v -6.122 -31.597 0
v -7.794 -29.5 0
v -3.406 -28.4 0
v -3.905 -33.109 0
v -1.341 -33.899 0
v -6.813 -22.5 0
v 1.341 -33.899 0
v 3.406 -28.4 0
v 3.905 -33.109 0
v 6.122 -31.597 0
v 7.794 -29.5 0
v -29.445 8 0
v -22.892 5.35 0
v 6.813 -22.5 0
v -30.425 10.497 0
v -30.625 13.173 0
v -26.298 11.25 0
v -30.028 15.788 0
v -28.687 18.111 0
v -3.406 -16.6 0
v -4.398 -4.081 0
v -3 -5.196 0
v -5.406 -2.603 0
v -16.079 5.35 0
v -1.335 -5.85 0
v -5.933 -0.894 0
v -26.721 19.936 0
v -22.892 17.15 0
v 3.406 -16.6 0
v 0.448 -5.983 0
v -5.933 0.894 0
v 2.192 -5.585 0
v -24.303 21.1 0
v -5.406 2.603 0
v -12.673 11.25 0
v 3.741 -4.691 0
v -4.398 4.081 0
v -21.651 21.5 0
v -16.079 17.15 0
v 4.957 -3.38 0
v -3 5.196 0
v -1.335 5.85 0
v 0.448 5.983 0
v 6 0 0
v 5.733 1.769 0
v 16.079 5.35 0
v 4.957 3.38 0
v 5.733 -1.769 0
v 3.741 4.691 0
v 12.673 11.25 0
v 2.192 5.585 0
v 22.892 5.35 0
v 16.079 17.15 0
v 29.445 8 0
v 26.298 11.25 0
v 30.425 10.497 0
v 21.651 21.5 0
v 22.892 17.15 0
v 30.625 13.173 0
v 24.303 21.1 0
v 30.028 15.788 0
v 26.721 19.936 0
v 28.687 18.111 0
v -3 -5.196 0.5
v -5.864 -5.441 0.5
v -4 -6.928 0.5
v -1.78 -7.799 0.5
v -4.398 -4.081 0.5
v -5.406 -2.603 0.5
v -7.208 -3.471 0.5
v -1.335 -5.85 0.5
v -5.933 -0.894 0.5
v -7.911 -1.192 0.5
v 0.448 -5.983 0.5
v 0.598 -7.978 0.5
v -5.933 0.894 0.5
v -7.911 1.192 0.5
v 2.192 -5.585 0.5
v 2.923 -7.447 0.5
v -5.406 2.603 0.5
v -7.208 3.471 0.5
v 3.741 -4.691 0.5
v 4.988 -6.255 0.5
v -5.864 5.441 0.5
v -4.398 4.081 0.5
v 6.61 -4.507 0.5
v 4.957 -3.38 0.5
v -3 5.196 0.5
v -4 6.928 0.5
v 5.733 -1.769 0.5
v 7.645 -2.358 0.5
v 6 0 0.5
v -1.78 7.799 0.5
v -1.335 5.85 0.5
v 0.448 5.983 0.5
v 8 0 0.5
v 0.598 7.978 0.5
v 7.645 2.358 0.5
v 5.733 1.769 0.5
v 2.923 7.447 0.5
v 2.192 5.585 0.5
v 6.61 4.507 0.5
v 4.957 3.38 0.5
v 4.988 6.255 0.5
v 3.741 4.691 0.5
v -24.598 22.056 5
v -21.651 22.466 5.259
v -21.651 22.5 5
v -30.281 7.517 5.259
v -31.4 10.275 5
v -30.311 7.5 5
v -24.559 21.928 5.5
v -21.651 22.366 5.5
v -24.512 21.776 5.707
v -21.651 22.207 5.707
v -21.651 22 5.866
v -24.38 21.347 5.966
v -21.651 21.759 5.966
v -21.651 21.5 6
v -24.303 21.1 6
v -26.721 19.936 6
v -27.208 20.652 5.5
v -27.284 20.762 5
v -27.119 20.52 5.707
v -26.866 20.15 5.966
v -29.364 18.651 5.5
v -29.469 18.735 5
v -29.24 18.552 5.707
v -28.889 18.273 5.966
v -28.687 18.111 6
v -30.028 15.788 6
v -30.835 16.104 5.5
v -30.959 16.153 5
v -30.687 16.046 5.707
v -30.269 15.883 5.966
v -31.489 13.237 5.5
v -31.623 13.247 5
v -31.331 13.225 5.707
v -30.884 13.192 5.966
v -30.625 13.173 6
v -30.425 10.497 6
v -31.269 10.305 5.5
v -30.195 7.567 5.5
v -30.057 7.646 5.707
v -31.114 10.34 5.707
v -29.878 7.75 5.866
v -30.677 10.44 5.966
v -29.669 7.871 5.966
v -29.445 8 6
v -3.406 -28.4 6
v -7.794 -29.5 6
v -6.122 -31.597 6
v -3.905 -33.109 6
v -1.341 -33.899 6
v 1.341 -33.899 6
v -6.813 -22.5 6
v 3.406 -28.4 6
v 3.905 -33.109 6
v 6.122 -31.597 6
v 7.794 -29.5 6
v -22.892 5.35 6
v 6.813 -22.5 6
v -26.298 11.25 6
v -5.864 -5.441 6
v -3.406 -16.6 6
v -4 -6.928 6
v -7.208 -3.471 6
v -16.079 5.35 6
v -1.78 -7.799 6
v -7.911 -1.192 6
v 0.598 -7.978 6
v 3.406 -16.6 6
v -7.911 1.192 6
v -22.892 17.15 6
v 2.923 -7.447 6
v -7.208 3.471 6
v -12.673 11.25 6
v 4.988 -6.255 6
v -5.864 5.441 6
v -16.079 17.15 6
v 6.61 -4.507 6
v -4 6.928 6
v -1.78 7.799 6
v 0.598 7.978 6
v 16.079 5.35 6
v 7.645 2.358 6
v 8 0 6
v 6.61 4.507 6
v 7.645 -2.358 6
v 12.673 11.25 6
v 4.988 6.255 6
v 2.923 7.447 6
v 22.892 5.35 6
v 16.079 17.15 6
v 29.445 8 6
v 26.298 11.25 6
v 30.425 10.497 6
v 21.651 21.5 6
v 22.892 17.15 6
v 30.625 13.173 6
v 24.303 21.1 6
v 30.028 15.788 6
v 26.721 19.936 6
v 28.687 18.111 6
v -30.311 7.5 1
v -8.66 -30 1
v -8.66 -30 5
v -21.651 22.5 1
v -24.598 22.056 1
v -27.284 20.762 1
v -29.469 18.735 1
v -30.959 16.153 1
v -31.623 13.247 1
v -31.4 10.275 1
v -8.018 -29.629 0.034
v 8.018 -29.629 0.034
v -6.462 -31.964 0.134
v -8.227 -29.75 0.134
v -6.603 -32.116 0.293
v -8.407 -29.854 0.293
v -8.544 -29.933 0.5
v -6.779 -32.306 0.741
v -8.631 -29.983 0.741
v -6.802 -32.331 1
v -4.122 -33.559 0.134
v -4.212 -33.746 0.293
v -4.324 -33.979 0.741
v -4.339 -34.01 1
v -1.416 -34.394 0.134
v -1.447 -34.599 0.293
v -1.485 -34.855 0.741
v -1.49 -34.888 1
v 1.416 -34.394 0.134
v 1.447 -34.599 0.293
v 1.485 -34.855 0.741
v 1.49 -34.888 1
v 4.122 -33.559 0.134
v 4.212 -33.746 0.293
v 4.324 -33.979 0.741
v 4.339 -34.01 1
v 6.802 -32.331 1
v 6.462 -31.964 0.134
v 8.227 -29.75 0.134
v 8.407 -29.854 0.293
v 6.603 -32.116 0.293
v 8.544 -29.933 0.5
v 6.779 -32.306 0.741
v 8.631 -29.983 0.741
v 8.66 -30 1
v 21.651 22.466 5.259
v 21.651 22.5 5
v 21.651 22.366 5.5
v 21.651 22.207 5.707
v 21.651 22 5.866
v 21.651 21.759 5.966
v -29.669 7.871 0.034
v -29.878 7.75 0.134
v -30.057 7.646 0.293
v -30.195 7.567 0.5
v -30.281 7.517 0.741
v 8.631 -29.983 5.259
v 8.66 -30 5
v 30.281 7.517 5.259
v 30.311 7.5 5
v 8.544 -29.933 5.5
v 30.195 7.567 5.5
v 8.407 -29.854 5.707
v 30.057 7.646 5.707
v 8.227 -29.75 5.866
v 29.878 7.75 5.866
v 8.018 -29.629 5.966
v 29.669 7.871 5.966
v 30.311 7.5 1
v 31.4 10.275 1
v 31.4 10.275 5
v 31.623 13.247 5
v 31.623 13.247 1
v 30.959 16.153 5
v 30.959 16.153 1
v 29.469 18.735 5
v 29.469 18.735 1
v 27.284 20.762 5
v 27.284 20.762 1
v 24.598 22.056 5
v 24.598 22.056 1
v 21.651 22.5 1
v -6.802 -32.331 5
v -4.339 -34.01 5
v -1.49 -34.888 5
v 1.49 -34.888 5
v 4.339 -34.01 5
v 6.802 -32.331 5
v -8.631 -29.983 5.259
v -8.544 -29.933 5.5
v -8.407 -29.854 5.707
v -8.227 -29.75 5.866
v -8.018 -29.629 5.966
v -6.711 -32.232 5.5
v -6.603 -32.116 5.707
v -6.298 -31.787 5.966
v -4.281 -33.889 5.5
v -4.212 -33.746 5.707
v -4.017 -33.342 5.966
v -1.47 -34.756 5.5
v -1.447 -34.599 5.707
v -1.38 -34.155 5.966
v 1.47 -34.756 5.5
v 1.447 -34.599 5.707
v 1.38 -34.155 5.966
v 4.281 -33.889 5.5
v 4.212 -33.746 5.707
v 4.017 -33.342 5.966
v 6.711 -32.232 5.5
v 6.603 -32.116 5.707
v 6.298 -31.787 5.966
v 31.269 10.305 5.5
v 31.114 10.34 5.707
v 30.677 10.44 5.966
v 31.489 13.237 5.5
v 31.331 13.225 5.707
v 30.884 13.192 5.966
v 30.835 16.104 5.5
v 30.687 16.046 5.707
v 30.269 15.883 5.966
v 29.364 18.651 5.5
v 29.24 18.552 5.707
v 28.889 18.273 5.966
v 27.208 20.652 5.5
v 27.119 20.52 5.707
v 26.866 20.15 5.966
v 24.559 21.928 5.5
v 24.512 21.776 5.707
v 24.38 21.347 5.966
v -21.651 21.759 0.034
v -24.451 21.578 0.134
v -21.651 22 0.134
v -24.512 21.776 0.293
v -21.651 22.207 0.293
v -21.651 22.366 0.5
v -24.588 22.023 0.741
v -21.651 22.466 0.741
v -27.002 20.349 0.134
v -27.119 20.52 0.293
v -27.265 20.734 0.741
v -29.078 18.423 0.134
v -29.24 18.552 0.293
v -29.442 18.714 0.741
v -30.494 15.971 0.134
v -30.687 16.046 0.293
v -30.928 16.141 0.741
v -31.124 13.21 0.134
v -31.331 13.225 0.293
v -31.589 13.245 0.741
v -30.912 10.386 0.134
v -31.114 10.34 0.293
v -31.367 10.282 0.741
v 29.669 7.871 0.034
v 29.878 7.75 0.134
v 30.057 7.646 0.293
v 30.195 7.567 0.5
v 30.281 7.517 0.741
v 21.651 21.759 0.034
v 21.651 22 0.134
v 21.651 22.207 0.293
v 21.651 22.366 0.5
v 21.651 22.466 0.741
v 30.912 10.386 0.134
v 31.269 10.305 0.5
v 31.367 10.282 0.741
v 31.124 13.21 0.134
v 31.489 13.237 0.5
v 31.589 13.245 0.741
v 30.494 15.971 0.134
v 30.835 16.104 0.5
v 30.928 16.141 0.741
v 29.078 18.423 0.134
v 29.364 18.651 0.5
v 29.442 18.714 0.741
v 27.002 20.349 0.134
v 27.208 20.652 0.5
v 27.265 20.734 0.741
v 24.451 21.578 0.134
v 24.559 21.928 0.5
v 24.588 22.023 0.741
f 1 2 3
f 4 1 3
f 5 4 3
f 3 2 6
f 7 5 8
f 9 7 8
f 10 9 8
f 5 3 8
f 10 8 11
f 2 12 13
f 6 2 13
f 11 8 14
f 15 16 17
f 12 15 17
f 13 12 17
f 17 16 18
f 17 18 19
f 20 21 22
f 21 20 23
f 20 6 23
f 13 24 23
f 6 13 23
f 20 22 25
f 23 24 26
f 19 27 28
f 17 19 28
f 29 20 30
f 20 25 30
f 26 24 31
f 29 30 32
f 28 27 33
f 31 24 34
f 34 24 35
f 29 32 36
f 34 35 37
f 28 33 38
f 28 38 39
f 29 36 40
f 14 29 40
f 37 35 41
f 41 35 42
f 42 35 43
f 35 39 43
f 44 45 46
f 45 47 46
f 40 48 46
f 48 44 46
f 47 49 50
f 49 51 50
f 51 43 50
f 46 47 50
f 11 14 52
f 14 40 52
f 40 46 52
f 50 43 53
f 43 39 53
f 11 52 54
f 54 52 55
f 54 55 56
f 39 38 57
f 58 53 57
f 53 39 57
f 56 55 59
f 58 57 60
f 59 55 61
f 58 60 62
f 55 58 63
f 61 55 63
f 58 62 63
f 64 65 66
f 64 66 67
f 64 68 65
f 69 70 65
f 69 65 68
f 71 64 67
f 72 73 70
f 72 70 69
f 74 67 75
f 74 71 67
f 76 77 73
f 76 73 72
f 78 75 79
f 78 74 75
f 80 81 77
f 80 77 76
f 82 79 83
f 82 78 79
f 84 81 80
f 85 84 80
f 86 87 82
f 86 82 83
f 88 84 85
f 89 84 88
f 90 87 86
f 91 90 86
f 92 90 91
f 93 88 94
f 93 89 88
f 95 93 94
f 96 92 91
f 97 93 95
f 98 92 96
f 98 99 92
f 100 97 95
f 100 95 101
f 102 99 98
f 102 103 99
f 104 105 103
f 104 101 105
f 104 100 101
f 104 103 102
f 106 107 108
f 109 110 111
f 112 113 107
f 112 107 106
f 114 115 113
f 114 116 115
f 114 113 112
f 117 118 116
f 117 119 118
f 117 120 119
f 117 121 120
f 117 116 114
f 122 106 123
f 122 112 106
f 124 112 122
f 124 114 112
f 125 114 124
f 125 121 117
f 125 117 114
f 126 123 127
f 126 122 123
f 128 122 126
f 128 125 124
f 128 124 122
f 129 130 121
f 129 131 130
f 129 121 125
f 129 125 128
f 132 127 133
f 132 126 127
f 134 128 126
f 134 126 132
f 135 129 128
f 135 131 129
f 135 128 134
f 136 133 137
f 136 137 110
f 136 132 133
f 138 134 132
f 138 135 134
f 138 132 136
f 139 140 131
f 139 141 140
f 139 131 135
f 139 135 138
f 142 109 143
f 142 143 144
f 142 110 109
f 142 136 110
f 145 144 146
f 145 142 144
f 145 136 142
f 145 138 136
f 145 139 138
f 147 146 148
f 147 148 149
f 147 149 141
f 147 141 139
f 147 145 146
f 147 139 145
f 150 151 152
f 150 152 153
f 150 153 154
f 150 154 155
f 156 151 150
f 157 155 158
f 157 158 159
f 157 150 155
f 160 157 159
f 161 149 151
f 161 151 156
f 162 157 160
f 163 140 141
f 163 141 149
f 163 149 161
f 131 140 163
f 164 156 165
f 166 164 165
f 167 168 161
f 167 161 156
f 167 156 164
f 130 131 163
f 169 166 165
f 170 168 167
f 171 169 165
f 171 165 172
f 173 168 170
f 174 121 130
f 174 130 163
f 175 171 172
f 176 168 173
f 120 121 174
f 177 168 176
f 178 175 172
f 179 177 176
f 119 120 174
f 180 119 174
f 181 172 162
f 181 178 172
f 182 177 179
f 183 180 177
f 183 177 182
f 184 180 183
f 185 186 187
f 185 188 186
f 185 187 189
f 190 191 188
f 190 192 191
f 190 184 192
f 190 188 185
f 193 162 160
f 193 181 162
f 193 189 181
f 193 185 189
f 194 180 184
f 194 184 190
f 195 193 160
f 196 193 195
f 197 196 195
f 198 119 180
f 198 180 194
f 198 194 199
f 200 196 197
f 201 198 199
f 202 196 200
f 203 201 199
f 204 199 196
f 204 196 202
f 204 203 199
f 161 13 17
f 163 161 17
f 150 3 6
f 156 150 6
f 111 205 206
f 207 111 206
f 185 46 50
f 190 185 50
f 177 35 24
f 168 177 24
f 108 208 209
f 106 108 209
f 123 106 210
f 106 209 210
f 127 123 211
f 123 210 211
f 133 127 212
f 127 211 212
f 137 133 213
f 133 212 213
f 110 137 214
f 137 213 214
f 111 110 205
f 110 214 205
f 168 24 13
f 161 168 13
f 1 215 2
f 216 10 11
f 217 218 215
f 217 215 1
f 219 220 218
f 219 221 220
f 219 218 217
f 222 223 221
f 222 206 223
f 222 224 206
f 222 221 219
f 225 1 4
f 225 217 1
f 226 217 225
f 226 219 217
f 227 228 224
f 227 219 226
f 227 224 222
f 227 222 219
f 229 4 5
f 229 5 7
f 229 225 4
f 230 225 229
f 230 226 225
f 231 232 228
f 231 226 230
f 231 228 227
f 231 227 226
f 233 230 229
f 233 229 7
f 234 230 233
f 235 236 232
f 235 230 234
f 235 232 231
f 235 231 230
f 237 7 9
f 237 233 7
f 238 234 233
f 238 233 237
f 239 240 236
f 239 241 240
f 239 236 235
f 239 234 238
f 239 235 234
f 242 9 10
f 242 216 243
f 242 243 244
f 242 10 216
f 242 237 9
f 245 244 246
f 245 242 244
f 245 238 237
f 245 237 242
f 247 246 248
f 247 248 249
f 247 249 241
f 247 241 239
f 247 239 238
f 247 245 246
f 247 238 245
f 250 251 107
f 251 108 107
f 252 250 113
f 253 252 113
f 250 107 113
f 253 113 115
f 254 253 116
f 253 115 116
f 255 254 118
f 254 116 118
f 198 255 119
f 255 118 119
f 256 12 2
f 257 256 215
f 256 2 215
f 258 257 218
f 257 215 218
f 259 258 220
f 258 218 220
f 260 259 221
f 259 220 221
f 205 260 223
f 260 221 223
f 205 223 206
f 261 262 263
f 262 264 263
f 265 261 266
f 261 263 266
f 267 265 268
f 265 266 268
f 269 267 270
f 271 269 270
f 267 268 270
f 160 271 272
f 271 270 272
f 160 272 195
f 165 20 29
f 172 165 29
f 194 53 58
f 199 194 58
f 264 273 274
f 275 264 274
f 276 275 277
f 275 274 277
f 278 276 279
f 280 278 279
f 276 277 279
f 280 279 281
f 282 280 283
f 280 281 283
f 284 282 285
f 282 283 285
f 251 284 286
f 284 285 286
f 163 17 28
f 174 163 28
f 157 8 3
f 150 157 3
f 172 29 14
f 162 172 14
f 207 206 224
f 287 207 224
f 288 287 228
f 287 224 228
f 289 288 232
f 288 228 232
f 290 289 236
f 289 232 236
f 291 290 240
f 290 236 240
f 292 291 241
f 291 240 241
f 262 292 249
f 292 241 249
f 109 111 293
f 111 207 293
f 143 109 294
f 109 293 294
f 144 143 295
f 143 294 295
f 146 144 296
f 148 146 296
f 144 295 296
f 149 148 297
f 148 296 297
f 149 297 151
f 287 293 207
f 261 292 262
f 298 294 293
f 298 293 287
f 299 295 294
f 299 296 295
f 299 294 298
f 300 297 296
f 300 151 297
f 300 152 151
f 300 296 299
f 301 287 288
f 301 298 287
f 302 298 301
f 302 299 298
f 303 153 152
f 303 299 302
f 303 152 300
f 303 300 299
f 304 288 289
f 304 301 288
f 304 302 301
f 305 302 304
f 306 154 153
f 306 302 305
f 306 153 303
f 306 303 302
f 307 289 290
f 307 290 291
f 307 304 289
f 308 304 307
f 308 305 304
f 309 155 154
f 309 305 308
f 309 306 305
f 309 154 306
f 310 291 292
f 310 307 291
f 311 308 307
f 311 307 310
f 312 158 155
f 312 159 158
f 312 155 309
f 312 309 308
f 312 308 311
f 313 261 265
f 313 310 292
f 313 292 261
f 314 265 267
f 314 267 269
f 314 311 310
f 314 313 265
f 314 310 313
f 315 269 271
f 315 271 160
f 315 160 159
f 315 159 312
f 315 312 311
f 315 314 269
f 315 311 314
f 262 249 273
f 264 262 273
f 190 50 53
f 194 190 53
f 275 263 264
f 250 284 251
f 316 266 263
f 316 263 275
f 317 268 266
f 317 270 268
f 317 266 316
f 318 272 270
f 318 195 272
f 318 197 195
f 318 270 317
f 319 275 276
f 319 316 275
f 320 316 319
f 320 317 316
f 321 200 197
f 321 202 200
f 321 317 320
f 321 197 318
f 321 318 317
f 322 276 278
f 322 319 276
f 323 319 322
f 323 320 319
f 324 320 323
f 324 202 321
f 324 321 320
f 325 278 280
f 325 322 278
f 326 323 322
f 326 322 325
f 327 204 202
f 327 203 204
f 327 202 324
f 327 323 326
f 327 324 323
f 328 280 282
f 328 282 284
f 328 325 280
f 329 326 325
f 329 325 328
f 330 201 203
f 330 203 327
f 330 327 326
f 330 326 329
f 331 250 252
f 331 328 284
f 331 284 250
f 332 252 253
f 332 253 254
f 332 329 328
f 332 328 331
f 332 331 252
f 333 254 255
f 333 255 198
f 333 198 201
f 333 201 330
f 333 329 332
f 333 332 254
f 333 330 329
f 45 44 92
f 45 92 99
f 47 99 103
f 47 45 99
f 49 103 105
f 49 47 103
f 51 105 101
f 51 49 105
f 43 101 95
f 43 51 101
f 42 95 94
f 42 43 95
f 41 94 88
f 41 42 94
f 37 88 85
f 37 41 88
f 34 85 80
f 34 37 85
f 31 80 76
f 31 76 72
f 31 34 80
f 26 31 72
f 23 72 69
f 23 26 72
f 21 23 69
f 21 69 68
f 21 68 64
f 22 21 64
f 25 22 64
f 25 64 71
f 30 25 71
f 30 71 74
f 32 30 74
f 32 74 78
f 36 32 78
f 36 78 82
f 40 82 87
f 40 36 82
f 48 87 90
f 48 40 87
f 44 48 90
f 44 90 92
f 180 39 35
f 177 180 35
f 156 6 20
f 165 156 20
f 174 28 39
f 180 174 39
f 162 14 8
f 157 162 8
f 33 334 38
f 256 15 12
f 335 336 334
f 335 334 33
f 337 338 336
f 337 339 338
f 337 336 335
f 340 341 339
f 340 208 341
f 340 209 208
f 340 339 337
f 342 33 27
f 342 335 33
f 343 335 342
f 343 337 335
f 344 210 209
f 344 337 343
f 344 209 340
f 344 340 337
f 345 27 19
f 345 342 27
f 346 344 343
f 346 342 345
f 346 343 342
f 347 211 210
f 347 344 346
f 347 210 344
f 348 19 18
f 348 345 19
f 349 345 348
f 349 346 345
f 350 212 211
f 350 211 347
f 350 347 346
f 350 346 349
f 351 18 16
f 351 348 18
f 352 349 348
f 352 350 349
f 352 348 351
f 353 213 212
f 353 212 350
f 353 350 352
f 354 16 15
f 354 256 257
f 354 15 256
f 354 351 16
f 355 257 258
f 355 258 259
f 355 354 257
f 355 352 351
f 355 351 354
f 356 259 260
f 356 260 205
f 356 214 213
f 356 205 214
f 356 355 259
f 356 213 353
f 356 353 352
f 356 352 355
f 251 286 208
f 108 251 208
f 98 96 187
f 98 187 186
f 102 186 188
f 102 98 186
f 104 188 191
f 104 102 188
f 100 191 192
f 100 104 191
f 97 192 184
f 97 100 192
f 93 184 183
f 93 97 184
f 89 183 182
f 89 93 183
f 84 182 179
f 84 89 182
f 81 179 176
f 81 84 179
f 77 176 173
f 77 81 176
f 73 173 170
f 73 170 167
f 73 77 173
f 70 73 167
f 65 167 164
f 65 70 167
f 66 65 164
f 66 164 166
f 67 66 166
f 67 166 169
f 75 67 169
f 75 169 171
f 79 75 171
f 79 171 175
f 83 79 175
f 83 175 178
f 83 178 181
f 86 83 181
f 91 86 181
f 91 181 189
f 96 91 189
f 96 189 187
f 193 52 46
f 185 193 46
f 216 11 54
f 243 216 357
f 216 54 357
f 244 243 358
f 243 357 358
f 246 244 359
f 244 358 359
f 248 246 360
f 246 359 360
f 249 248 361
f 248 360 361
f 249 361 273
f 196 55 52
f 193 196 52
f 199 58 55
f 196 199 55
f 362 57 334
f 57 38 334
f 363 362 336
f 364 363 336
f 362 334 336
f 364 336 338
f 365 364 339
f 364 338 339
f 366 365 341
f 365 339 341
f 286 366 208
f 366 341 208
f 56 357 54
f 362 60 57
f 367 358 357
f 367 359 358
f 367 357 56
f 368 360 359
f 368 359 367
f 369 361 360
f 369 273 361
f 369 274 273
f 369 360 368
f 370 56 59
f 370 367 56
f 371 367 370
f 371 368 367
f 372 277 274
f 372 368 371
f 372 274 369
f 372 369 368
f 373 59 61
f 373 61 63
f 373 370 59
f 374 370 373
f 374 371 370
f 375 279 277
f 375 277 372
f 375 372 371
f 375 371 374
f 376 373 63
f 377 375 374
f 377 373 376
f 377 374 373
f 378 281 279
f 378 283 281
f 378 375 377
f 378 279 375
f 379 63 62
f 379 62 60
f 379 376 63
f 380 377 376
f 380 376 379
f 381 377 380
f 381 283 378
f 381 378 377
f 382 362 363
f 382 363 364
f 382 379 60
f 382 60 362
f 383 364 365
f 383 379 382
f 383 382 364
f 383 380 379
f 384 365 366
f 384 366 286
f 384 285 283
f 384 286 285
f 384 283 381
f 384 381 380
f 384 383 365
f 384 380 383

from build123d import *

# Parameters (mm, degrees)
F0_R     = 8
F1_DEPTH = 6
F2_R     = 8
F2_R_2   = 6
F3_DEPTH = 0.5
F4_R     = 1


with BuildPart() as f1:
    # F0 (on Top) → F1 (new body)
    with BuildSketch(Plane.XY):
        with BuildLine():
            Line((8.660254, -30), (30.310889, 7.5))
            ThreePointArc((30.310889, 7.5), (30.310889, 17.5), (21.650635, 22.5))
            Line((21.650635, 22.5), (-21.650635, 22.5))
            ThreePointArc((-21.650635, 22.5), (-30.310889, 17.5), (-30.310889, 7.5))
            Line((-30.310889, 7.5), (-8.660254, -30))
            ThreePointArc((-8.660254, -30), (0, -35), (8.660254, -30))
        make_face()
        Polygon((-3.406367, -16.6), (3.406367, -16.6), (6.812733, -22.5), (3.406367, -28.4), (-3.406367, -28.4), (-6.812733, -22.5), align=None, mode=Mode.SUBTRACT)
        Circle(F0_R, mode=Mode.SUBTRACT)
        Polygon((-16.079205, 17.15), (-12.672838, 11.25), (-16.079205, 5.35), (-22.891938, 5.35), (-26.298305, 11.25), (-22.891938, 17.15), align=None, mode=Mode.SUBTRACT)
        Polygon((22.891938, 5.35), (16.079205, 5.35), (12.672838, 11.25), (16.079205, 17.15), (22.891938, 17.15), (26.298305, 11.25), align=None, mode=Mode.SUBTRACT)
    extrude(amount=F1_DEPTH)

    # F2 (on Top) → F3 (join)
    with BuildSketch(Plane.XY):
        Circle(F2_R)
        Circle(F2_R_2, mode=Mode.SUBTRACT)
    extrude(amount=F3_DEPTH)

    # F4
    f4_edges = [f1.edges().sort_by_distance(p)[0] for p in [
        (0, 22.5, 6),
        (0, 22.5, 0),
    ]]
    fillet(f4_edges, radius=F4_R)


solid = f1.part
